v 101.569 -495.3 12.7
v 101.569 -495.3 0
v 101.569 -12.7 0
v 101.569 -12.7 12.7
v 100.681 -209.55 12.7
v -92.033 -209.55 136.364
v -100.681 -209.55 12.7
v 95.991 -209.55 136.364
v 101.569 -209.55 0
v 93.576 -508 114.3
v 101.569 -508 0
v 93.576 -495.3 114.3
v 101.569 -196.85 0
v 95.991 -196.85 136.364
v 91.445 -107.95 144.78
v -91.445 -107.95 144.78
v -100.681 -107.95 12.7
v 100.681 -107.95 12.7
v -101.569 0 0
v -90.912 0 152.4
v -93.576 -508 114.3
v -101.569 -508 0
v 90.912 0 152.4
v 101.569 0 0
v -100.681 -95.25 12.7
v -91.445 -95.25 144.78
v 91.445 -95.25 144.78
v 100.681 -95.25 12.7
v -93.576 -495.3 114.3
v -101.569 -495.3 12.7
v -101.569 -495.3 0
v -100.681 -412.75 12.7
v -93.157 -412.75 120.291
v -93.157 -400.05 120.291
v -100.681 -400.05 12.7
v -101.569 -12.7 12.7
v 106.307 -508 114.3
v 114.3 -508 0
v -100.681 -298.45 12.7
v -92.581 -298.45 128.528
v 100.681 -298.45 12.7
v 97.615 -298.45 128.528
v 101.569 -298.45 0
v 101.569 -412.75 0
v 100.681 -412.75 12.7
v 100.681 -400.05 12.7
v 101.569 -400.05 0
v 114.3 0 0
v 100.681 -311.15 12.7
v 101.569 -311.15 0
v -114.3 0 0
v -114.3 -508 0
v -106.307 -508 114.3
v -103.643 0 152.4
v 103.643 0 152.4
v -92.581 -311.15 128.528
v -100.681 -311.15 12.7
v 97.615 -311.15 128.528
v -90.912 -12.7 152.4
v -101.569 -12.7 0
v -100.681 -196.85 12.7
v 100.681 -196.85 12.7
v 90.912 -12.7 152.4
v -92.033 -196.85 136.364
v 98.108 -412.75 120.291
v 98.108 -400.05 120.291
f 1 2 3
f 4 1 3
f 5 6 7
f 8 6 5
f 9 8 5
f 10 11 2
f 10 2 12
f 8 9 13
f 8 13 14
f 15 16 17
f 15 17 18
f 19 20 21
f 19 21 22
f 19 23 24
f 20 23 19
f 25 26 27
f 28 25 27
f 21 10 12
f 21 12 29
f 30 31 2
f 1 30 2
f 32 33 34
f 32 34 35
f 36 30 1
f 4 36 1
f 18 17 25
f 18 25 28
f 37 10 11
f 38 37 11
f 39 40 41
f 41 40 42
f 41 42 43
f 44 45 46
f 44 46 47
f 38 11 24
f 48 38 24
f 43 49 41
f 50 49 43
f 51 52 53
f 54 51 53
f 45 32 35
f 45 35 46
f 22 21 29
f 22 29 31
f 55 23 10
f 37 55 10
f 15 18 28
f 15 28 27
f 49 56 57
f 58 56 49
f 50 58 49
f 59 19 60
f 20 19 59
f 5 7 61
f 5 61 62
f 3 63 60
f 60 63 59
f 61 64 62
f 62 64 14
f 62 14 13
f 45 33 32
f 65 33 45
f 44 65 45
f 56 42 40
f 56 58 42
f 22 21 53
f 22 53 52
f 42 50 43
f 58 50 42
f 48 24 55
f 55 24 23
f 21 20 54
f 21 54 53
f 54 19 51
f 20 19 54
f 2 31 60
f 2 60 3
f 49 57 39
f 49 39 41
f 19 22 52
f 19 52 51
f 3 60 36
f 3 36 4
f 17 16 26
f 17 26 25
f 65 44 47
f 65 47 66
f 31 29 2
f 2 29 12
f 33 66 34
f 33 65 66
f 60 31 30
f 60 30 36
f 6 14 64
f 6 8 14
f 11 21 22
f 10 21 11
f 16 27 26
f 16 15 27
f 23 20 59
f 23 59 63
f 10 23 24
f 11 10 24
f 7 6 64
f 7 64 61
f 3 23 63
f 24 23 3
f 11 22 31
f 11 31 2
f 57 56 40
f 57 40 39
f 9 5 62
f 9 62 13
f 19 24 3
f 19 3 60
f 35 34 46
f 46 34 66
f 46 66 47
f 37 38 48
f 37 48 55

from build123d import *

# Parameters (mm, degrees)
F1_DEPTH       = 114.3
F3_DEPTH       = 528.32
F5_DEPTH       = 508
F8_DEPTH       = 12.7
F14_DEPTH      = 6.35
F14_DEPTH_BACK = 6.35
F16_DEPTH      = 6.35
F16_DEPTH_BACK = 6.35
F18_DEPTH      = 6.35
F18_DEPTH_BACK = 6.35
F21_DEPTH      = 6.35
F21_DEPTH_BACK = 6.35
F22_DEPTH      = 12.7
F24_DEPTH      = 482.6
F25_W          = 203.1379757887
F25_H          = 482.6
F26_DEPTH      = 12.7


with BuildPart() as f1:
    # F0 (on Right) → F1 (new body)
    with BuildSketch(Plane.YZ):
        Polygon((-508, 0), (0, 0), (0, 152.4), (-508, 114.3), align=None)
    extrude(amount=-F1_DEPTH)

    # F2 (on Front) → F3 (cut)
    with BuildSketch(Plane.XZ):
        Polygon((-133.1725418568, 0), (-114.3, 0), (-103.4560899626, 155.075138362), (-133.1725418568, 155.075138362), align=None)
    extrude(amount=F3_DEPTH, mode=Mode.SUBTRACT)

    # F4 (on Front) → F5 (cut)
    with BuildSketch(Plane.XZ):
        Polygon((0, 168.3597160092), (-90.1831365799, 162.8252596961), (-102.7114227376, -16.3375794131), (0, -16.3375794131), align=None)
    extrude(amount=F5_DEPTH, mode=Mode.SUBTRACT)


with BuildPart() as f6_1:
    # F6: instance of F1
    add(f1.part.mirror(Plane.YZ))


with BuildPart() as f8:
    # F7 (on face) → F8 (new body)
    with BuildSketch(Plane(origin=(0, 0, 0), x_dir=(-1, 0, 0), z_dir=(0, 1, 0))):
        Polygon((90.9121417542, 152.4), (-90.9121417542, 152.4), (-101.5689878944, 0), (101.5689878944, 0), align=None)
    extrude(amount=-F8_DEPTH)


with BuildPart() as f14:
    # F13 (on offset) → F14 (new body, two sides)
    with BuildSketch(Plane.XZ.offset(101.6)) as f14_sk:
        Polygon((-91.4449941175, 144.7798561883), (-101.5689878944, 0), (101.5689878944, 0), (91.4449941175, 144.7798561883), align=None)
    extrude(amount=F14_DEPTH)
    extrude(f14_sk.sketch, amount=-F14_DEPTH_BACK)


with BuildPart() as f16:
    # F15 (on offset) → F16 (new body, two sides)
    with BuildSketch(Plane.XZ.offset(203.2)) as f16_sk:
        Polygon((-92.0334642807, 136.3643407822), (-101.5689878944, 0), (101.5689878944, 0), (95.9908664227, 136.3643407822), align=None)
    extrude(amount=F16_DEPTH)
    extrude(f16_sk.sketch, amount=-F16_DEPTH_BACK)


with BuildPart() as f18:
    # F17 (on offset) → F18 (new body, two sides)
    with BuildSketch(Plane.XZ.offset(304.8)) as f18_sk:
        Polygon((-92.5814200962, 128.5282075405), (-101.5689878944, 0), (101.5689878944, 0), (97.6148098707, 128.5282075405), align=None)
    extrude(amount=F18_DEPTH)
    extrude(f18_sk.sketch, amount=-F18_DEPTH_BACK)


with BuildPart() as f21:
    # F20 (on offset) → F21 (new body, two sides)
    with BuildSketch(Plane.XZ.offset(406.4)) as f21_sk:
        Polygon((-93.1574158814, 120.2910840511), (-101.5689878944, 0), (101.5689878944, 0), (98.1075614691, 120.2910840511), align=None)
    extrude(amount=F21_DEPTH)
    extrude(f21_sk.sketch, amount=-F21_DEPTH_BACK)


with BuildPart() as f22:
    # F9 (on face) → F22 (new body)
    with BuildSketch(Plane.XZ.offset(508)):
        Polygon((-93.5763532892, 114.3), (-101.5689878944, 0), (101.5689878944, 0), (93.5763532892, 114.3), align=None)
    extrude(amount=-F22_DEPTH)


with BuildPart() as f24_tool:
    # F23 (on face) → F24 (new body, through all)
    with BuildSketch(Plane(origin=(0, -495.3, 0), x_dir=(-1, 0, 0), z_dir=(0, 1, 0))):
        Polygon((-100.6809173827, 12.7), (-101.5689878944, 0), (101.5689878944, 0), (100.6809173827, 12.7), align=None)
    extrude(amount=F24_DEPTH)


with BuildPart() as f14_1:
    add(f14.part)

    # F24: cut by f24_tool
    add(f24_tool.part, mode=Mode.SUBTRACT)


with BuildPart() as f16_1:
    add(f16.part)

    # F24: cut by f24_tool
    add(f24_tool.part, mode=Mode.SUBTRACT)


with BuildPart() as f18_1:
    add(f18.part)

    # F24: cut by f24_tool
    add(f24_tool.part, mode=Mode.SUBTRACT)


with BuildPart() as f21_1:
    add(f21.part)

    # F24: cut by f24_tool
    add(f24_tool.part, mode=Mode.SUBTRACT)


with BuildPart() as f26:
    # F25 (on Top) → F26 (new body)
    with BuildSketch(Plane.XY):
        with Locations((0, -254)):
            Rectangle(F25_W, F25_H)
    extrude(amount=F26_DEPTH)


solid = Compound([f1.part, f6_1.part, f8.part, f22.part, f14_1.part, f16_1.part, f18_1.part, f21_1.part, f26.part])
